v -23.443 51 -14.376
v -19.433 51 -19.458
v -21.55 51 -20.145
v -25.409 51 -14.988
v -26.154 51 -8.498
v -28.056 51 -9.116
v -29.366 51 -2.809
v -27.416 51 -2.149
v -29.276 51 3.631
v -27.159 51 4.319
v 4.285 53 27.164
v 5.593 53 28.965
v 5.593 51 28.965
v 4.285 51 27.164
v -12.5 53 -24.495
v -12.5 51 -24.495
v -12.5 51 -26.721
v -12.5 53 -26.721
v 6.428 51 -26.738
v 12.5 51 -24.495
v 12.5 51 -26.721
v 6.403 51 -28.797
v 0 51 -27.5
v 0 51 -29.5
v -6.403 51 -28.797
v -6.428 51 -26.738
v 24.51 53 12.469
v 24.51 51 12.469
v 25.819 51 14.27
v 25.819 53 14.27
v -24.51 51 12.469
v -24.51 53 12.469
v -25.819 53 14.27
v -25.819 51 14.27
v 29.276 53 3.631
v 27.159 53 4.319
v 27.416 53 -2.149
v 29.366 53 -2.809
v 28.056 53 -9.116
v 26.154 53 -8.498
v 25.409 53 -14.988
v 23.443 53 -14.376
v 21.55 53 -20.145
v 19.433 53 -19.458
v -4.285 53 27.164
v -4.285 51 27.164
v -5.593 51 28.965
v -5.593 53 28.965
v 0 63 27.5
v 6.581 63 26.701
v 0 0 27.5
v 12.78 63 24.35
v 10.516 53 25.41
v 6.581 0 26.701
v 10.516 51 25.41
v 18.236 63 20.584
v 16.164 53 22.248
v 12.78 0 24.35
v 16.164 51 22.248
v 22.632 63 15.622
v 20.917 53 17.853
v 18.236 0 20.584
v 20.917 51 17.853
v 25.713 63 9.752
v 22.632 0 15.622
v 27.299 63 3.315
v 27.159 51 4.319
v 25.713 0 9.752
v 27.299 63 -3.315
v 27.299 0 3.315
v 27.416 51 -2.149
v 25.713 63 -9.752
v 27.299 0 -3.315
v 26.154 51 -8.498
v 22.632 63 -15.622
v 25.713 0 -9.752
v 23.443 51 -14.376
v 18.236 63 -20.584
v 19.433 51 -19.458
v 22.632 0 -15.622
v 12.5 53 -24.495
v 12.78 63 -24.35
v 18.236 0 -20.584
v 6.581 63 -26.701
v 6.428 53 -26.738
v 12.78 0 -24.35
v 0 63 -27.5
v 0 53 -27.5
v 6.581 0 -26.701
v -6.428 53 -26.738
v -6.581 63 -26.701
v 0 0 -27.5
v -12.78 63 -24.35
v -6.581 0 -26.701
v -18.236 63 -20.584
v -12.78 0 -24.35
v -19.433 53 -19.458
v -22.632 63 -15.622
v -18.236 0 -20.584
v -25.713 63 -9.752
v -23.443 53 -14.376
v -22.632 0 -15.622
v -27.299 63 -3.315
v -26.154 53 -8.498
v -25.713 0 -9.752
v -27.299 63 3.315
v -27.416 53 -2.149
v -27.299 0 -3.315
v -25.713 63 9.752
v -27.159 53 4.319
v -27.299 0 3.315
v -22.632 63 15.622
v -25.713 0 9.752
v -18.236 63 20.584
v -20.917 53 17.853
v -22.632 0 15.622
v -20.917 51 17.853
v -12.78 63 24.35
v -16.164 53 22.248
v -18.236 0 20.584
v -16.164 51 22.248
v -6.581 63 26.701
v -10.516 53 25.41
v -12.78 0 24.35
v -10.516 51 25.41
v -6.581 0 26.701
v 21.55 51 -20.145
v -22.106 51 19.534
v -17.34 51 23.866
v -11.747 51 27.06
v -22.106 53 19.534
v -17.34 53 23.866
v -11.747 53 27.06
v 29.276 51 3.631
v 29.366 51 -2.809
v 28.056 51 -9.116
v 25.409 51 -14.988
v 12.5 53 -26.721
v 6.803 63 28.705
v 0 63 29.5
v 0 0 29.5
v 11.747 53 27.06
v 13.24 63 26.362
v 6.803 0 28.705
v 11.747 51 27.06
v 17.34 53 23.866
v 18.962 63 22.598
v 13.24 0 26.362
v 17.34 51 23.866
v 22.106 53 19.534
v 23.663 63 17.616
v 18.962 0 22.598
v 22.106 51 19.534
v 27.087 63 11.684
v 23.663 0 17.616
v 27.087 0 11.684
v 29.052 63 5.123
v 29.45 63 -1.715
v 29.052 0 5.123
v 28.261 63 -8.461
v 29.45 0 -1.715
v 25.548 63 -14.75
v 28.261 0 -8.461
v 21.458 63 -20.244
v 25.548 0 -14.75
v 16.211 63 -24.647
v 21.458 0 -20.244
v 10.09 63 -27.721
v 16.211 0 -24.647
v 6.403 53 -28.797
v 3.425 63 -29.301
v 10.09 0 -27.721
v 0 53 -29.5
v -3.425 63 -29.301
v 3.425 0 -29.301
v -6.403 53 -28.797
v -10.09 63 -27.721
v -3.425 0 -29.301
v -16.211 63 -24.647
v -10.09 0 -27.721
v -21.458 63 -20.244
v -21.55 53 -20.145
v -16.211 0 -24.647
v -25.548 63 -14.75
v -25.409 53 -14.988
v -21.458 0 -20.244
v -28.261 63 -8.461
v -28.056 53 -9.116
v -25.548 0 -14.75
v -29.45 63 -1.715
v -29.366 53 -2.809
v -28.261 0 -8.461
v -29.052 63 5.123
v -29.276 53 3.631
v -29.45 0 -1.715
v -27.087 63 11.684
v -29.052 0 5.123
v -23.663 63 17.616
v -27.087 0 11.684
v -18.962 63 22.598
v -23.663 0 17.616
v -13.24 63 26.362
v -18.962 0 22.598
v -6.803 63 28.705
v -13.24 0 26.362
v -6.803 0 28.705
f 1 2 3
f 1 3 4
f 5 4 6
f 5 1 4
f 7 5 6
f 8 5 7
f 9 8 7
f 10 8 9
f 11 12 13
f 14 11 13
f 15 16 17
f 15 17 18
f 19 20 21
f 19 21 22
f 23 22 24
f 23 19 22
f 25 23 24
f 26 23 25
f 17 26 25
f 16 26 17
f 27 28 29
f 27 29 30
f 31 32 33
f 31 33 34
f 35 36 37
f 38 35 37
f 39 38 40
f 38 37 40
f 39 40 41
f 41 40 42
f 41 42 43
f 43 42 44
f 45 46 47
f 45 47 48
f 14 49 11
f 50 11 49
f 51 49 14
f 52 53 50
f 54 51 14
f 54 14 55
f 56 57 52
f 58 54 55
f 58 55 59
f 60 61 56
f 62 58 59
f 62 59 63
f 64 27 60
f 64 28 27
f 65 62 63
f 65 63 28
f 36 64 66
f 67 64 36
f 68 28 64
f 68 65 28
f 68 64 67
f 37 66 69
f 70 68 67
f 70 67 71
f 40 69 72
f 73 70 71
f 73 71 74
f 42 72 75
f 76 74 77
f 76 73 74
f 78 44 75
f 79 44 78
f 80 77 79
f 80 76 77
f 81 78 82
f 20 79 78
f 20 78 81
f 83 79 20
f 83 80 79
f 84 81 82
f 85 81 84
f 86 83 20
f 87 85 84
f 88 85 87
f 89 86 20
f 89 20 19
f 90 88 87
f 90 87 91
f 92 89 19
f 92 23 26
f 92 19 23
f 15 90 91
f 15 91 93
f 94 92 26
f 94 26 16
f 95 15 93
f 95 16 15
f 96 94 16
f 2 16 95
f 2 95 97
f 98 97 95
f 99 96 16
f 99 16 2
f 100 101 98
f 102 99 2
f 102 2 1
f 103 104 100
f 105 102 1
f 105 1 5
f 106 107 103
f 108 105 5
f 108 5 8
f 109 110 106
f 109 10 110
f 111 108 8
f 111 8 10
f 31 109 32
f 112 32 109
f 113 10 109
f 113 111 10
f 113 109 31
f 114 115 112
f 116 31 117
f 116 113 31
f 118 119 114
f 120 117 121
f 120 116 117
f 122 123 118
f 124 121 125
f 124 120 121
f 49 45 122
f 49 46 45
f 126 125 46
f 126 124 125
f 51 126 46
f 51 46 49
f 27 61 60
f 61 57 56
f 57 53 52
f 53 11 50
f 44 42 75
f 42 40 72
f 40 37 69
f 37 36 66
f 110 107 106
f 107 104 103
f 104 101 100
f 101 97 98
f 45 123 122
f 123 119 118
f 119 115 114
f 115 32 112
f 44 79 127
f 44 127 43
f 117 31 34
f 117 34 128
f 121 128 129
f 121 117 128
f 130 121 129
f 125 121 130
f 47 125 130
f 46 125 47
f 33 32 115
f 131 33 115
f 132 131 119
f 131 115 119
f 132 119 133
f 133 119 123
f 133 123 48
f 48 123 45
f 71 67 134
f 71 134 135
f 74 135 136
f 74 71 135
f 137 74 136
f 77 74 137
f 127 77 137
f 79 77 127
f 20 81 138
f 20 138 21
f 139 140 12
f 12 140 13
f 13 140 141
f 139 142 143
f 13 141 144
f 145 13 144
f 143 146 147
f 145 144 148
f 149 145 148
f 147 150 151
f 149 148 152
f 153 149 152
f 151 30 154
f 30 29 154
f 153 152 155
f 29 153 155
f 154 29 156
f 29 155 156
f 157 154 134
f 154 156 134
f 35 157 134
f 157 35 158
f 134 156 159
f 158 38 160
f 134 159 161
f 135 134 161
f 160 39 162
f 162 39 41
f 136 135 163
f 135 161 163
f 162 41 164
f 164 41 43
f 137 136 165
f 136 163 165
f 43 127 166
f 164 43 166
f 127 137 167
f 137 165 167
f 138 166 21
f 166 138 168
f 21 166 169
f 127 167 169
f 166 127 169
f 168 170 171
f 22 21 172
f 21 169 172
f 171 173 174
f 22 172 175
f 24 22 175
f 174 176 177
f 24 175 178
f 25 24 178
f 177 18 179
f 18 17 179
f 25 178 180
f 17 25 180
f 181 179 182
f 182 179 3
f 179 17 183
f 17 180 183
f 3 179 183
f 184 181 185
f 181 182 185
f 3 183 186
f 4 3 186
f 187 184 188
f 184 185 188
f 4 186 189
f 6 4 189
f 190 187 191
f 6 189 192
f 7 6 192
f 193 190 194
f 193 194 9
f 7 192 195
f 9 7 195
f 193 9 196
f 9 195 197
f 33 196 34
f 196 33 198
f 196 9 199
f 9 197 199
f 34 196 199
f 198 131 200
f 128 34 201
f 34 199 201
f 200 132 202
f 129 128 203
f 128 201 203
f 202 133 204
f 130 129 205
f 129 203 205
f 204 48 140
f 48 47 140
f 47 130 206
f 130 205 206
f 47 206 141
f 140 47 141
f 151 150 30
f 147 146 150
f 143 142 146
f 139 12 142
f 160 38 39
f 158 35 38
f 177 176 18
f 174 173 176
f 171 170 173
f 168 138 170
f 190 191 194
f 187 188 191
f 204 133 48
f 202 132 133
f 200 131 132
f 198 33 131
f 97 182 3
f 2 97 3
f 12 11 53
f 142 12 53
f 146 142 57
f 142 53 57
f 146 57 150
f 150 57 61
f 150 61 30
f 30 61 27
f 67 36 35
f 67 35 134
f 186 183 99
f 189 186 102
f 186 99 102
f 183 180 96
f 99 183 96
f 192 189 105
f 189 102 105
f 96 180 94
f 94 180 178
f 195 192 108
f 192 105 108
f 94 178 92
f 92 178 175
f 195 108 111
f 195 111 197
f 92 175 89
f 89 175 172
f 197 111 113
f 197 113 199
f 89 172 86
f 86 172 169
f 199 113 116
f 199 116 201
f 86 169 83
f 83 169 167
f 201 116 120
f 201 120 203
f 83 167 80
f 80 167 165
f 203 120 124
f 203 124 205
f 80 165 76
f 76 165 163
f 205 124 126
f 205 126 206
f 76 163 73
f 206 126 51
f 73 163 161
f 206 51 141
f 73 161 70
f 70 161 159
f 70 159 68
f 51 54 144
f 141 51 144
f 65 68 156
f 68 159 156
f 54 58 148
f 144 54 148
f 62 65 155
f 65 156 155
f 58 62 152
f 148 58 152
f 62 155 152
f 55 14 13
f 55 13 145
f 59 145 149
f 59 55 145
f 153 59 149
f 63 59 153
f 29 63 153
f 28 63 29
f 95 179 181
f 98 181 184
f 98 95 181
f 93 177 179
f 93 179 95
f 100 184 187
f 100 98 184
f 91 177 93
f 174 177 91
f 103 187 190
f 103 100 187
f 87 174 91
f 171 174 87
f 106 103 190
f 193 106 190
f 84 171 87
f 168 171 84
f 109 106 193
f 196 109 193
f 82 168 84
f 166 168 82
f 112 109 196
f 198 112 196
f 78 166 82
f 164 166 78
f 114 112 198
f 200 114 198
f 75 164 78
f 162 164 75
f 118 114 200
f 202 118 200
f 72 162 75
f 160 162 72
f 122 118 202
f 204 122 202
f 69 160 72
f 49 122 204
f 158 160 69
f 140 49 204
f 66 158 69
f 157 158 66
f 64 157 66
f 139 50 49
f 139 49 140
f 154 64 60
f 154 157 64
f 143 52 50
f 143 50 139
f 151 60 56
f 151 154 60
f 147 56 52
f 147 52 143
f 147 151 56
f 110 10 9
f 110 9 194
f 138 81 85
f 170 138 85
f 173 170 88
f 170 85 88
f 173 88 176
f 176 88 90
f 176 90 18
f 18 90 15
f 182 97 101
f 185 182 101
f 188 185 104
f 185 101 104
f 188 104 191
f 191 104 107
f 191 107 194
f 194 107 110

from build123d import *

# Parameters (mm, degrees)
SKETCH1_R           = 29.5
SKETCH1_R_2         = 27.5
BOSS_EXTRUDE1_DEPTH = 63
CUT_EXTRUDE1_DEPTH  = 33
CIRPATTERN1_COUNT   = 5


with BuildPart() as part:
    # Sketch1 → Boss-Extrude1 (new body)
    with BuildSketch(Plane(origin=(0, 0, 0), x_dir=(1, 0, 0), z_dir=(0, 1, 0))):
        with Locations(Location((0, 0, 0), (0, 0, 270))):
            Circle(SKETCH1_R)
        with Locations(Location((0, 0, 0), (0, 0, 270))):
            Circle(SKETCH1_R_2, mode=Mode.SUBTRACT)
    extrude(amount=BOSS_EXTRUDE1_DEPTH)

    # Sketch3 → Cut-Extrude1 (cut)
    with BuildSketch(Plane.XY):
        Polygon((0, 53), (12.5, 53), (12.5, 51), (-12.5, 51), (-12.5, 53), align=None)
    cut_extrude1 = extrude(amount=-CUT_EXTRUDE1_DEPTH, mode=Mode.SUBTRACT)

    # CirPattern1: Cut-Extrude1 ×5 about axis
    cirpattern1_axis = Axis((0, 0, 0), (0, 1, 0))
    for i in range(1, CIRPATTERN1_COUNT):
        add(cut_extrude1.rotate(cirpattern1_axis, i * 360 / CIRPATTERN1_COUNT), mode=Mode.SUBTRACT)


solid = part.part
